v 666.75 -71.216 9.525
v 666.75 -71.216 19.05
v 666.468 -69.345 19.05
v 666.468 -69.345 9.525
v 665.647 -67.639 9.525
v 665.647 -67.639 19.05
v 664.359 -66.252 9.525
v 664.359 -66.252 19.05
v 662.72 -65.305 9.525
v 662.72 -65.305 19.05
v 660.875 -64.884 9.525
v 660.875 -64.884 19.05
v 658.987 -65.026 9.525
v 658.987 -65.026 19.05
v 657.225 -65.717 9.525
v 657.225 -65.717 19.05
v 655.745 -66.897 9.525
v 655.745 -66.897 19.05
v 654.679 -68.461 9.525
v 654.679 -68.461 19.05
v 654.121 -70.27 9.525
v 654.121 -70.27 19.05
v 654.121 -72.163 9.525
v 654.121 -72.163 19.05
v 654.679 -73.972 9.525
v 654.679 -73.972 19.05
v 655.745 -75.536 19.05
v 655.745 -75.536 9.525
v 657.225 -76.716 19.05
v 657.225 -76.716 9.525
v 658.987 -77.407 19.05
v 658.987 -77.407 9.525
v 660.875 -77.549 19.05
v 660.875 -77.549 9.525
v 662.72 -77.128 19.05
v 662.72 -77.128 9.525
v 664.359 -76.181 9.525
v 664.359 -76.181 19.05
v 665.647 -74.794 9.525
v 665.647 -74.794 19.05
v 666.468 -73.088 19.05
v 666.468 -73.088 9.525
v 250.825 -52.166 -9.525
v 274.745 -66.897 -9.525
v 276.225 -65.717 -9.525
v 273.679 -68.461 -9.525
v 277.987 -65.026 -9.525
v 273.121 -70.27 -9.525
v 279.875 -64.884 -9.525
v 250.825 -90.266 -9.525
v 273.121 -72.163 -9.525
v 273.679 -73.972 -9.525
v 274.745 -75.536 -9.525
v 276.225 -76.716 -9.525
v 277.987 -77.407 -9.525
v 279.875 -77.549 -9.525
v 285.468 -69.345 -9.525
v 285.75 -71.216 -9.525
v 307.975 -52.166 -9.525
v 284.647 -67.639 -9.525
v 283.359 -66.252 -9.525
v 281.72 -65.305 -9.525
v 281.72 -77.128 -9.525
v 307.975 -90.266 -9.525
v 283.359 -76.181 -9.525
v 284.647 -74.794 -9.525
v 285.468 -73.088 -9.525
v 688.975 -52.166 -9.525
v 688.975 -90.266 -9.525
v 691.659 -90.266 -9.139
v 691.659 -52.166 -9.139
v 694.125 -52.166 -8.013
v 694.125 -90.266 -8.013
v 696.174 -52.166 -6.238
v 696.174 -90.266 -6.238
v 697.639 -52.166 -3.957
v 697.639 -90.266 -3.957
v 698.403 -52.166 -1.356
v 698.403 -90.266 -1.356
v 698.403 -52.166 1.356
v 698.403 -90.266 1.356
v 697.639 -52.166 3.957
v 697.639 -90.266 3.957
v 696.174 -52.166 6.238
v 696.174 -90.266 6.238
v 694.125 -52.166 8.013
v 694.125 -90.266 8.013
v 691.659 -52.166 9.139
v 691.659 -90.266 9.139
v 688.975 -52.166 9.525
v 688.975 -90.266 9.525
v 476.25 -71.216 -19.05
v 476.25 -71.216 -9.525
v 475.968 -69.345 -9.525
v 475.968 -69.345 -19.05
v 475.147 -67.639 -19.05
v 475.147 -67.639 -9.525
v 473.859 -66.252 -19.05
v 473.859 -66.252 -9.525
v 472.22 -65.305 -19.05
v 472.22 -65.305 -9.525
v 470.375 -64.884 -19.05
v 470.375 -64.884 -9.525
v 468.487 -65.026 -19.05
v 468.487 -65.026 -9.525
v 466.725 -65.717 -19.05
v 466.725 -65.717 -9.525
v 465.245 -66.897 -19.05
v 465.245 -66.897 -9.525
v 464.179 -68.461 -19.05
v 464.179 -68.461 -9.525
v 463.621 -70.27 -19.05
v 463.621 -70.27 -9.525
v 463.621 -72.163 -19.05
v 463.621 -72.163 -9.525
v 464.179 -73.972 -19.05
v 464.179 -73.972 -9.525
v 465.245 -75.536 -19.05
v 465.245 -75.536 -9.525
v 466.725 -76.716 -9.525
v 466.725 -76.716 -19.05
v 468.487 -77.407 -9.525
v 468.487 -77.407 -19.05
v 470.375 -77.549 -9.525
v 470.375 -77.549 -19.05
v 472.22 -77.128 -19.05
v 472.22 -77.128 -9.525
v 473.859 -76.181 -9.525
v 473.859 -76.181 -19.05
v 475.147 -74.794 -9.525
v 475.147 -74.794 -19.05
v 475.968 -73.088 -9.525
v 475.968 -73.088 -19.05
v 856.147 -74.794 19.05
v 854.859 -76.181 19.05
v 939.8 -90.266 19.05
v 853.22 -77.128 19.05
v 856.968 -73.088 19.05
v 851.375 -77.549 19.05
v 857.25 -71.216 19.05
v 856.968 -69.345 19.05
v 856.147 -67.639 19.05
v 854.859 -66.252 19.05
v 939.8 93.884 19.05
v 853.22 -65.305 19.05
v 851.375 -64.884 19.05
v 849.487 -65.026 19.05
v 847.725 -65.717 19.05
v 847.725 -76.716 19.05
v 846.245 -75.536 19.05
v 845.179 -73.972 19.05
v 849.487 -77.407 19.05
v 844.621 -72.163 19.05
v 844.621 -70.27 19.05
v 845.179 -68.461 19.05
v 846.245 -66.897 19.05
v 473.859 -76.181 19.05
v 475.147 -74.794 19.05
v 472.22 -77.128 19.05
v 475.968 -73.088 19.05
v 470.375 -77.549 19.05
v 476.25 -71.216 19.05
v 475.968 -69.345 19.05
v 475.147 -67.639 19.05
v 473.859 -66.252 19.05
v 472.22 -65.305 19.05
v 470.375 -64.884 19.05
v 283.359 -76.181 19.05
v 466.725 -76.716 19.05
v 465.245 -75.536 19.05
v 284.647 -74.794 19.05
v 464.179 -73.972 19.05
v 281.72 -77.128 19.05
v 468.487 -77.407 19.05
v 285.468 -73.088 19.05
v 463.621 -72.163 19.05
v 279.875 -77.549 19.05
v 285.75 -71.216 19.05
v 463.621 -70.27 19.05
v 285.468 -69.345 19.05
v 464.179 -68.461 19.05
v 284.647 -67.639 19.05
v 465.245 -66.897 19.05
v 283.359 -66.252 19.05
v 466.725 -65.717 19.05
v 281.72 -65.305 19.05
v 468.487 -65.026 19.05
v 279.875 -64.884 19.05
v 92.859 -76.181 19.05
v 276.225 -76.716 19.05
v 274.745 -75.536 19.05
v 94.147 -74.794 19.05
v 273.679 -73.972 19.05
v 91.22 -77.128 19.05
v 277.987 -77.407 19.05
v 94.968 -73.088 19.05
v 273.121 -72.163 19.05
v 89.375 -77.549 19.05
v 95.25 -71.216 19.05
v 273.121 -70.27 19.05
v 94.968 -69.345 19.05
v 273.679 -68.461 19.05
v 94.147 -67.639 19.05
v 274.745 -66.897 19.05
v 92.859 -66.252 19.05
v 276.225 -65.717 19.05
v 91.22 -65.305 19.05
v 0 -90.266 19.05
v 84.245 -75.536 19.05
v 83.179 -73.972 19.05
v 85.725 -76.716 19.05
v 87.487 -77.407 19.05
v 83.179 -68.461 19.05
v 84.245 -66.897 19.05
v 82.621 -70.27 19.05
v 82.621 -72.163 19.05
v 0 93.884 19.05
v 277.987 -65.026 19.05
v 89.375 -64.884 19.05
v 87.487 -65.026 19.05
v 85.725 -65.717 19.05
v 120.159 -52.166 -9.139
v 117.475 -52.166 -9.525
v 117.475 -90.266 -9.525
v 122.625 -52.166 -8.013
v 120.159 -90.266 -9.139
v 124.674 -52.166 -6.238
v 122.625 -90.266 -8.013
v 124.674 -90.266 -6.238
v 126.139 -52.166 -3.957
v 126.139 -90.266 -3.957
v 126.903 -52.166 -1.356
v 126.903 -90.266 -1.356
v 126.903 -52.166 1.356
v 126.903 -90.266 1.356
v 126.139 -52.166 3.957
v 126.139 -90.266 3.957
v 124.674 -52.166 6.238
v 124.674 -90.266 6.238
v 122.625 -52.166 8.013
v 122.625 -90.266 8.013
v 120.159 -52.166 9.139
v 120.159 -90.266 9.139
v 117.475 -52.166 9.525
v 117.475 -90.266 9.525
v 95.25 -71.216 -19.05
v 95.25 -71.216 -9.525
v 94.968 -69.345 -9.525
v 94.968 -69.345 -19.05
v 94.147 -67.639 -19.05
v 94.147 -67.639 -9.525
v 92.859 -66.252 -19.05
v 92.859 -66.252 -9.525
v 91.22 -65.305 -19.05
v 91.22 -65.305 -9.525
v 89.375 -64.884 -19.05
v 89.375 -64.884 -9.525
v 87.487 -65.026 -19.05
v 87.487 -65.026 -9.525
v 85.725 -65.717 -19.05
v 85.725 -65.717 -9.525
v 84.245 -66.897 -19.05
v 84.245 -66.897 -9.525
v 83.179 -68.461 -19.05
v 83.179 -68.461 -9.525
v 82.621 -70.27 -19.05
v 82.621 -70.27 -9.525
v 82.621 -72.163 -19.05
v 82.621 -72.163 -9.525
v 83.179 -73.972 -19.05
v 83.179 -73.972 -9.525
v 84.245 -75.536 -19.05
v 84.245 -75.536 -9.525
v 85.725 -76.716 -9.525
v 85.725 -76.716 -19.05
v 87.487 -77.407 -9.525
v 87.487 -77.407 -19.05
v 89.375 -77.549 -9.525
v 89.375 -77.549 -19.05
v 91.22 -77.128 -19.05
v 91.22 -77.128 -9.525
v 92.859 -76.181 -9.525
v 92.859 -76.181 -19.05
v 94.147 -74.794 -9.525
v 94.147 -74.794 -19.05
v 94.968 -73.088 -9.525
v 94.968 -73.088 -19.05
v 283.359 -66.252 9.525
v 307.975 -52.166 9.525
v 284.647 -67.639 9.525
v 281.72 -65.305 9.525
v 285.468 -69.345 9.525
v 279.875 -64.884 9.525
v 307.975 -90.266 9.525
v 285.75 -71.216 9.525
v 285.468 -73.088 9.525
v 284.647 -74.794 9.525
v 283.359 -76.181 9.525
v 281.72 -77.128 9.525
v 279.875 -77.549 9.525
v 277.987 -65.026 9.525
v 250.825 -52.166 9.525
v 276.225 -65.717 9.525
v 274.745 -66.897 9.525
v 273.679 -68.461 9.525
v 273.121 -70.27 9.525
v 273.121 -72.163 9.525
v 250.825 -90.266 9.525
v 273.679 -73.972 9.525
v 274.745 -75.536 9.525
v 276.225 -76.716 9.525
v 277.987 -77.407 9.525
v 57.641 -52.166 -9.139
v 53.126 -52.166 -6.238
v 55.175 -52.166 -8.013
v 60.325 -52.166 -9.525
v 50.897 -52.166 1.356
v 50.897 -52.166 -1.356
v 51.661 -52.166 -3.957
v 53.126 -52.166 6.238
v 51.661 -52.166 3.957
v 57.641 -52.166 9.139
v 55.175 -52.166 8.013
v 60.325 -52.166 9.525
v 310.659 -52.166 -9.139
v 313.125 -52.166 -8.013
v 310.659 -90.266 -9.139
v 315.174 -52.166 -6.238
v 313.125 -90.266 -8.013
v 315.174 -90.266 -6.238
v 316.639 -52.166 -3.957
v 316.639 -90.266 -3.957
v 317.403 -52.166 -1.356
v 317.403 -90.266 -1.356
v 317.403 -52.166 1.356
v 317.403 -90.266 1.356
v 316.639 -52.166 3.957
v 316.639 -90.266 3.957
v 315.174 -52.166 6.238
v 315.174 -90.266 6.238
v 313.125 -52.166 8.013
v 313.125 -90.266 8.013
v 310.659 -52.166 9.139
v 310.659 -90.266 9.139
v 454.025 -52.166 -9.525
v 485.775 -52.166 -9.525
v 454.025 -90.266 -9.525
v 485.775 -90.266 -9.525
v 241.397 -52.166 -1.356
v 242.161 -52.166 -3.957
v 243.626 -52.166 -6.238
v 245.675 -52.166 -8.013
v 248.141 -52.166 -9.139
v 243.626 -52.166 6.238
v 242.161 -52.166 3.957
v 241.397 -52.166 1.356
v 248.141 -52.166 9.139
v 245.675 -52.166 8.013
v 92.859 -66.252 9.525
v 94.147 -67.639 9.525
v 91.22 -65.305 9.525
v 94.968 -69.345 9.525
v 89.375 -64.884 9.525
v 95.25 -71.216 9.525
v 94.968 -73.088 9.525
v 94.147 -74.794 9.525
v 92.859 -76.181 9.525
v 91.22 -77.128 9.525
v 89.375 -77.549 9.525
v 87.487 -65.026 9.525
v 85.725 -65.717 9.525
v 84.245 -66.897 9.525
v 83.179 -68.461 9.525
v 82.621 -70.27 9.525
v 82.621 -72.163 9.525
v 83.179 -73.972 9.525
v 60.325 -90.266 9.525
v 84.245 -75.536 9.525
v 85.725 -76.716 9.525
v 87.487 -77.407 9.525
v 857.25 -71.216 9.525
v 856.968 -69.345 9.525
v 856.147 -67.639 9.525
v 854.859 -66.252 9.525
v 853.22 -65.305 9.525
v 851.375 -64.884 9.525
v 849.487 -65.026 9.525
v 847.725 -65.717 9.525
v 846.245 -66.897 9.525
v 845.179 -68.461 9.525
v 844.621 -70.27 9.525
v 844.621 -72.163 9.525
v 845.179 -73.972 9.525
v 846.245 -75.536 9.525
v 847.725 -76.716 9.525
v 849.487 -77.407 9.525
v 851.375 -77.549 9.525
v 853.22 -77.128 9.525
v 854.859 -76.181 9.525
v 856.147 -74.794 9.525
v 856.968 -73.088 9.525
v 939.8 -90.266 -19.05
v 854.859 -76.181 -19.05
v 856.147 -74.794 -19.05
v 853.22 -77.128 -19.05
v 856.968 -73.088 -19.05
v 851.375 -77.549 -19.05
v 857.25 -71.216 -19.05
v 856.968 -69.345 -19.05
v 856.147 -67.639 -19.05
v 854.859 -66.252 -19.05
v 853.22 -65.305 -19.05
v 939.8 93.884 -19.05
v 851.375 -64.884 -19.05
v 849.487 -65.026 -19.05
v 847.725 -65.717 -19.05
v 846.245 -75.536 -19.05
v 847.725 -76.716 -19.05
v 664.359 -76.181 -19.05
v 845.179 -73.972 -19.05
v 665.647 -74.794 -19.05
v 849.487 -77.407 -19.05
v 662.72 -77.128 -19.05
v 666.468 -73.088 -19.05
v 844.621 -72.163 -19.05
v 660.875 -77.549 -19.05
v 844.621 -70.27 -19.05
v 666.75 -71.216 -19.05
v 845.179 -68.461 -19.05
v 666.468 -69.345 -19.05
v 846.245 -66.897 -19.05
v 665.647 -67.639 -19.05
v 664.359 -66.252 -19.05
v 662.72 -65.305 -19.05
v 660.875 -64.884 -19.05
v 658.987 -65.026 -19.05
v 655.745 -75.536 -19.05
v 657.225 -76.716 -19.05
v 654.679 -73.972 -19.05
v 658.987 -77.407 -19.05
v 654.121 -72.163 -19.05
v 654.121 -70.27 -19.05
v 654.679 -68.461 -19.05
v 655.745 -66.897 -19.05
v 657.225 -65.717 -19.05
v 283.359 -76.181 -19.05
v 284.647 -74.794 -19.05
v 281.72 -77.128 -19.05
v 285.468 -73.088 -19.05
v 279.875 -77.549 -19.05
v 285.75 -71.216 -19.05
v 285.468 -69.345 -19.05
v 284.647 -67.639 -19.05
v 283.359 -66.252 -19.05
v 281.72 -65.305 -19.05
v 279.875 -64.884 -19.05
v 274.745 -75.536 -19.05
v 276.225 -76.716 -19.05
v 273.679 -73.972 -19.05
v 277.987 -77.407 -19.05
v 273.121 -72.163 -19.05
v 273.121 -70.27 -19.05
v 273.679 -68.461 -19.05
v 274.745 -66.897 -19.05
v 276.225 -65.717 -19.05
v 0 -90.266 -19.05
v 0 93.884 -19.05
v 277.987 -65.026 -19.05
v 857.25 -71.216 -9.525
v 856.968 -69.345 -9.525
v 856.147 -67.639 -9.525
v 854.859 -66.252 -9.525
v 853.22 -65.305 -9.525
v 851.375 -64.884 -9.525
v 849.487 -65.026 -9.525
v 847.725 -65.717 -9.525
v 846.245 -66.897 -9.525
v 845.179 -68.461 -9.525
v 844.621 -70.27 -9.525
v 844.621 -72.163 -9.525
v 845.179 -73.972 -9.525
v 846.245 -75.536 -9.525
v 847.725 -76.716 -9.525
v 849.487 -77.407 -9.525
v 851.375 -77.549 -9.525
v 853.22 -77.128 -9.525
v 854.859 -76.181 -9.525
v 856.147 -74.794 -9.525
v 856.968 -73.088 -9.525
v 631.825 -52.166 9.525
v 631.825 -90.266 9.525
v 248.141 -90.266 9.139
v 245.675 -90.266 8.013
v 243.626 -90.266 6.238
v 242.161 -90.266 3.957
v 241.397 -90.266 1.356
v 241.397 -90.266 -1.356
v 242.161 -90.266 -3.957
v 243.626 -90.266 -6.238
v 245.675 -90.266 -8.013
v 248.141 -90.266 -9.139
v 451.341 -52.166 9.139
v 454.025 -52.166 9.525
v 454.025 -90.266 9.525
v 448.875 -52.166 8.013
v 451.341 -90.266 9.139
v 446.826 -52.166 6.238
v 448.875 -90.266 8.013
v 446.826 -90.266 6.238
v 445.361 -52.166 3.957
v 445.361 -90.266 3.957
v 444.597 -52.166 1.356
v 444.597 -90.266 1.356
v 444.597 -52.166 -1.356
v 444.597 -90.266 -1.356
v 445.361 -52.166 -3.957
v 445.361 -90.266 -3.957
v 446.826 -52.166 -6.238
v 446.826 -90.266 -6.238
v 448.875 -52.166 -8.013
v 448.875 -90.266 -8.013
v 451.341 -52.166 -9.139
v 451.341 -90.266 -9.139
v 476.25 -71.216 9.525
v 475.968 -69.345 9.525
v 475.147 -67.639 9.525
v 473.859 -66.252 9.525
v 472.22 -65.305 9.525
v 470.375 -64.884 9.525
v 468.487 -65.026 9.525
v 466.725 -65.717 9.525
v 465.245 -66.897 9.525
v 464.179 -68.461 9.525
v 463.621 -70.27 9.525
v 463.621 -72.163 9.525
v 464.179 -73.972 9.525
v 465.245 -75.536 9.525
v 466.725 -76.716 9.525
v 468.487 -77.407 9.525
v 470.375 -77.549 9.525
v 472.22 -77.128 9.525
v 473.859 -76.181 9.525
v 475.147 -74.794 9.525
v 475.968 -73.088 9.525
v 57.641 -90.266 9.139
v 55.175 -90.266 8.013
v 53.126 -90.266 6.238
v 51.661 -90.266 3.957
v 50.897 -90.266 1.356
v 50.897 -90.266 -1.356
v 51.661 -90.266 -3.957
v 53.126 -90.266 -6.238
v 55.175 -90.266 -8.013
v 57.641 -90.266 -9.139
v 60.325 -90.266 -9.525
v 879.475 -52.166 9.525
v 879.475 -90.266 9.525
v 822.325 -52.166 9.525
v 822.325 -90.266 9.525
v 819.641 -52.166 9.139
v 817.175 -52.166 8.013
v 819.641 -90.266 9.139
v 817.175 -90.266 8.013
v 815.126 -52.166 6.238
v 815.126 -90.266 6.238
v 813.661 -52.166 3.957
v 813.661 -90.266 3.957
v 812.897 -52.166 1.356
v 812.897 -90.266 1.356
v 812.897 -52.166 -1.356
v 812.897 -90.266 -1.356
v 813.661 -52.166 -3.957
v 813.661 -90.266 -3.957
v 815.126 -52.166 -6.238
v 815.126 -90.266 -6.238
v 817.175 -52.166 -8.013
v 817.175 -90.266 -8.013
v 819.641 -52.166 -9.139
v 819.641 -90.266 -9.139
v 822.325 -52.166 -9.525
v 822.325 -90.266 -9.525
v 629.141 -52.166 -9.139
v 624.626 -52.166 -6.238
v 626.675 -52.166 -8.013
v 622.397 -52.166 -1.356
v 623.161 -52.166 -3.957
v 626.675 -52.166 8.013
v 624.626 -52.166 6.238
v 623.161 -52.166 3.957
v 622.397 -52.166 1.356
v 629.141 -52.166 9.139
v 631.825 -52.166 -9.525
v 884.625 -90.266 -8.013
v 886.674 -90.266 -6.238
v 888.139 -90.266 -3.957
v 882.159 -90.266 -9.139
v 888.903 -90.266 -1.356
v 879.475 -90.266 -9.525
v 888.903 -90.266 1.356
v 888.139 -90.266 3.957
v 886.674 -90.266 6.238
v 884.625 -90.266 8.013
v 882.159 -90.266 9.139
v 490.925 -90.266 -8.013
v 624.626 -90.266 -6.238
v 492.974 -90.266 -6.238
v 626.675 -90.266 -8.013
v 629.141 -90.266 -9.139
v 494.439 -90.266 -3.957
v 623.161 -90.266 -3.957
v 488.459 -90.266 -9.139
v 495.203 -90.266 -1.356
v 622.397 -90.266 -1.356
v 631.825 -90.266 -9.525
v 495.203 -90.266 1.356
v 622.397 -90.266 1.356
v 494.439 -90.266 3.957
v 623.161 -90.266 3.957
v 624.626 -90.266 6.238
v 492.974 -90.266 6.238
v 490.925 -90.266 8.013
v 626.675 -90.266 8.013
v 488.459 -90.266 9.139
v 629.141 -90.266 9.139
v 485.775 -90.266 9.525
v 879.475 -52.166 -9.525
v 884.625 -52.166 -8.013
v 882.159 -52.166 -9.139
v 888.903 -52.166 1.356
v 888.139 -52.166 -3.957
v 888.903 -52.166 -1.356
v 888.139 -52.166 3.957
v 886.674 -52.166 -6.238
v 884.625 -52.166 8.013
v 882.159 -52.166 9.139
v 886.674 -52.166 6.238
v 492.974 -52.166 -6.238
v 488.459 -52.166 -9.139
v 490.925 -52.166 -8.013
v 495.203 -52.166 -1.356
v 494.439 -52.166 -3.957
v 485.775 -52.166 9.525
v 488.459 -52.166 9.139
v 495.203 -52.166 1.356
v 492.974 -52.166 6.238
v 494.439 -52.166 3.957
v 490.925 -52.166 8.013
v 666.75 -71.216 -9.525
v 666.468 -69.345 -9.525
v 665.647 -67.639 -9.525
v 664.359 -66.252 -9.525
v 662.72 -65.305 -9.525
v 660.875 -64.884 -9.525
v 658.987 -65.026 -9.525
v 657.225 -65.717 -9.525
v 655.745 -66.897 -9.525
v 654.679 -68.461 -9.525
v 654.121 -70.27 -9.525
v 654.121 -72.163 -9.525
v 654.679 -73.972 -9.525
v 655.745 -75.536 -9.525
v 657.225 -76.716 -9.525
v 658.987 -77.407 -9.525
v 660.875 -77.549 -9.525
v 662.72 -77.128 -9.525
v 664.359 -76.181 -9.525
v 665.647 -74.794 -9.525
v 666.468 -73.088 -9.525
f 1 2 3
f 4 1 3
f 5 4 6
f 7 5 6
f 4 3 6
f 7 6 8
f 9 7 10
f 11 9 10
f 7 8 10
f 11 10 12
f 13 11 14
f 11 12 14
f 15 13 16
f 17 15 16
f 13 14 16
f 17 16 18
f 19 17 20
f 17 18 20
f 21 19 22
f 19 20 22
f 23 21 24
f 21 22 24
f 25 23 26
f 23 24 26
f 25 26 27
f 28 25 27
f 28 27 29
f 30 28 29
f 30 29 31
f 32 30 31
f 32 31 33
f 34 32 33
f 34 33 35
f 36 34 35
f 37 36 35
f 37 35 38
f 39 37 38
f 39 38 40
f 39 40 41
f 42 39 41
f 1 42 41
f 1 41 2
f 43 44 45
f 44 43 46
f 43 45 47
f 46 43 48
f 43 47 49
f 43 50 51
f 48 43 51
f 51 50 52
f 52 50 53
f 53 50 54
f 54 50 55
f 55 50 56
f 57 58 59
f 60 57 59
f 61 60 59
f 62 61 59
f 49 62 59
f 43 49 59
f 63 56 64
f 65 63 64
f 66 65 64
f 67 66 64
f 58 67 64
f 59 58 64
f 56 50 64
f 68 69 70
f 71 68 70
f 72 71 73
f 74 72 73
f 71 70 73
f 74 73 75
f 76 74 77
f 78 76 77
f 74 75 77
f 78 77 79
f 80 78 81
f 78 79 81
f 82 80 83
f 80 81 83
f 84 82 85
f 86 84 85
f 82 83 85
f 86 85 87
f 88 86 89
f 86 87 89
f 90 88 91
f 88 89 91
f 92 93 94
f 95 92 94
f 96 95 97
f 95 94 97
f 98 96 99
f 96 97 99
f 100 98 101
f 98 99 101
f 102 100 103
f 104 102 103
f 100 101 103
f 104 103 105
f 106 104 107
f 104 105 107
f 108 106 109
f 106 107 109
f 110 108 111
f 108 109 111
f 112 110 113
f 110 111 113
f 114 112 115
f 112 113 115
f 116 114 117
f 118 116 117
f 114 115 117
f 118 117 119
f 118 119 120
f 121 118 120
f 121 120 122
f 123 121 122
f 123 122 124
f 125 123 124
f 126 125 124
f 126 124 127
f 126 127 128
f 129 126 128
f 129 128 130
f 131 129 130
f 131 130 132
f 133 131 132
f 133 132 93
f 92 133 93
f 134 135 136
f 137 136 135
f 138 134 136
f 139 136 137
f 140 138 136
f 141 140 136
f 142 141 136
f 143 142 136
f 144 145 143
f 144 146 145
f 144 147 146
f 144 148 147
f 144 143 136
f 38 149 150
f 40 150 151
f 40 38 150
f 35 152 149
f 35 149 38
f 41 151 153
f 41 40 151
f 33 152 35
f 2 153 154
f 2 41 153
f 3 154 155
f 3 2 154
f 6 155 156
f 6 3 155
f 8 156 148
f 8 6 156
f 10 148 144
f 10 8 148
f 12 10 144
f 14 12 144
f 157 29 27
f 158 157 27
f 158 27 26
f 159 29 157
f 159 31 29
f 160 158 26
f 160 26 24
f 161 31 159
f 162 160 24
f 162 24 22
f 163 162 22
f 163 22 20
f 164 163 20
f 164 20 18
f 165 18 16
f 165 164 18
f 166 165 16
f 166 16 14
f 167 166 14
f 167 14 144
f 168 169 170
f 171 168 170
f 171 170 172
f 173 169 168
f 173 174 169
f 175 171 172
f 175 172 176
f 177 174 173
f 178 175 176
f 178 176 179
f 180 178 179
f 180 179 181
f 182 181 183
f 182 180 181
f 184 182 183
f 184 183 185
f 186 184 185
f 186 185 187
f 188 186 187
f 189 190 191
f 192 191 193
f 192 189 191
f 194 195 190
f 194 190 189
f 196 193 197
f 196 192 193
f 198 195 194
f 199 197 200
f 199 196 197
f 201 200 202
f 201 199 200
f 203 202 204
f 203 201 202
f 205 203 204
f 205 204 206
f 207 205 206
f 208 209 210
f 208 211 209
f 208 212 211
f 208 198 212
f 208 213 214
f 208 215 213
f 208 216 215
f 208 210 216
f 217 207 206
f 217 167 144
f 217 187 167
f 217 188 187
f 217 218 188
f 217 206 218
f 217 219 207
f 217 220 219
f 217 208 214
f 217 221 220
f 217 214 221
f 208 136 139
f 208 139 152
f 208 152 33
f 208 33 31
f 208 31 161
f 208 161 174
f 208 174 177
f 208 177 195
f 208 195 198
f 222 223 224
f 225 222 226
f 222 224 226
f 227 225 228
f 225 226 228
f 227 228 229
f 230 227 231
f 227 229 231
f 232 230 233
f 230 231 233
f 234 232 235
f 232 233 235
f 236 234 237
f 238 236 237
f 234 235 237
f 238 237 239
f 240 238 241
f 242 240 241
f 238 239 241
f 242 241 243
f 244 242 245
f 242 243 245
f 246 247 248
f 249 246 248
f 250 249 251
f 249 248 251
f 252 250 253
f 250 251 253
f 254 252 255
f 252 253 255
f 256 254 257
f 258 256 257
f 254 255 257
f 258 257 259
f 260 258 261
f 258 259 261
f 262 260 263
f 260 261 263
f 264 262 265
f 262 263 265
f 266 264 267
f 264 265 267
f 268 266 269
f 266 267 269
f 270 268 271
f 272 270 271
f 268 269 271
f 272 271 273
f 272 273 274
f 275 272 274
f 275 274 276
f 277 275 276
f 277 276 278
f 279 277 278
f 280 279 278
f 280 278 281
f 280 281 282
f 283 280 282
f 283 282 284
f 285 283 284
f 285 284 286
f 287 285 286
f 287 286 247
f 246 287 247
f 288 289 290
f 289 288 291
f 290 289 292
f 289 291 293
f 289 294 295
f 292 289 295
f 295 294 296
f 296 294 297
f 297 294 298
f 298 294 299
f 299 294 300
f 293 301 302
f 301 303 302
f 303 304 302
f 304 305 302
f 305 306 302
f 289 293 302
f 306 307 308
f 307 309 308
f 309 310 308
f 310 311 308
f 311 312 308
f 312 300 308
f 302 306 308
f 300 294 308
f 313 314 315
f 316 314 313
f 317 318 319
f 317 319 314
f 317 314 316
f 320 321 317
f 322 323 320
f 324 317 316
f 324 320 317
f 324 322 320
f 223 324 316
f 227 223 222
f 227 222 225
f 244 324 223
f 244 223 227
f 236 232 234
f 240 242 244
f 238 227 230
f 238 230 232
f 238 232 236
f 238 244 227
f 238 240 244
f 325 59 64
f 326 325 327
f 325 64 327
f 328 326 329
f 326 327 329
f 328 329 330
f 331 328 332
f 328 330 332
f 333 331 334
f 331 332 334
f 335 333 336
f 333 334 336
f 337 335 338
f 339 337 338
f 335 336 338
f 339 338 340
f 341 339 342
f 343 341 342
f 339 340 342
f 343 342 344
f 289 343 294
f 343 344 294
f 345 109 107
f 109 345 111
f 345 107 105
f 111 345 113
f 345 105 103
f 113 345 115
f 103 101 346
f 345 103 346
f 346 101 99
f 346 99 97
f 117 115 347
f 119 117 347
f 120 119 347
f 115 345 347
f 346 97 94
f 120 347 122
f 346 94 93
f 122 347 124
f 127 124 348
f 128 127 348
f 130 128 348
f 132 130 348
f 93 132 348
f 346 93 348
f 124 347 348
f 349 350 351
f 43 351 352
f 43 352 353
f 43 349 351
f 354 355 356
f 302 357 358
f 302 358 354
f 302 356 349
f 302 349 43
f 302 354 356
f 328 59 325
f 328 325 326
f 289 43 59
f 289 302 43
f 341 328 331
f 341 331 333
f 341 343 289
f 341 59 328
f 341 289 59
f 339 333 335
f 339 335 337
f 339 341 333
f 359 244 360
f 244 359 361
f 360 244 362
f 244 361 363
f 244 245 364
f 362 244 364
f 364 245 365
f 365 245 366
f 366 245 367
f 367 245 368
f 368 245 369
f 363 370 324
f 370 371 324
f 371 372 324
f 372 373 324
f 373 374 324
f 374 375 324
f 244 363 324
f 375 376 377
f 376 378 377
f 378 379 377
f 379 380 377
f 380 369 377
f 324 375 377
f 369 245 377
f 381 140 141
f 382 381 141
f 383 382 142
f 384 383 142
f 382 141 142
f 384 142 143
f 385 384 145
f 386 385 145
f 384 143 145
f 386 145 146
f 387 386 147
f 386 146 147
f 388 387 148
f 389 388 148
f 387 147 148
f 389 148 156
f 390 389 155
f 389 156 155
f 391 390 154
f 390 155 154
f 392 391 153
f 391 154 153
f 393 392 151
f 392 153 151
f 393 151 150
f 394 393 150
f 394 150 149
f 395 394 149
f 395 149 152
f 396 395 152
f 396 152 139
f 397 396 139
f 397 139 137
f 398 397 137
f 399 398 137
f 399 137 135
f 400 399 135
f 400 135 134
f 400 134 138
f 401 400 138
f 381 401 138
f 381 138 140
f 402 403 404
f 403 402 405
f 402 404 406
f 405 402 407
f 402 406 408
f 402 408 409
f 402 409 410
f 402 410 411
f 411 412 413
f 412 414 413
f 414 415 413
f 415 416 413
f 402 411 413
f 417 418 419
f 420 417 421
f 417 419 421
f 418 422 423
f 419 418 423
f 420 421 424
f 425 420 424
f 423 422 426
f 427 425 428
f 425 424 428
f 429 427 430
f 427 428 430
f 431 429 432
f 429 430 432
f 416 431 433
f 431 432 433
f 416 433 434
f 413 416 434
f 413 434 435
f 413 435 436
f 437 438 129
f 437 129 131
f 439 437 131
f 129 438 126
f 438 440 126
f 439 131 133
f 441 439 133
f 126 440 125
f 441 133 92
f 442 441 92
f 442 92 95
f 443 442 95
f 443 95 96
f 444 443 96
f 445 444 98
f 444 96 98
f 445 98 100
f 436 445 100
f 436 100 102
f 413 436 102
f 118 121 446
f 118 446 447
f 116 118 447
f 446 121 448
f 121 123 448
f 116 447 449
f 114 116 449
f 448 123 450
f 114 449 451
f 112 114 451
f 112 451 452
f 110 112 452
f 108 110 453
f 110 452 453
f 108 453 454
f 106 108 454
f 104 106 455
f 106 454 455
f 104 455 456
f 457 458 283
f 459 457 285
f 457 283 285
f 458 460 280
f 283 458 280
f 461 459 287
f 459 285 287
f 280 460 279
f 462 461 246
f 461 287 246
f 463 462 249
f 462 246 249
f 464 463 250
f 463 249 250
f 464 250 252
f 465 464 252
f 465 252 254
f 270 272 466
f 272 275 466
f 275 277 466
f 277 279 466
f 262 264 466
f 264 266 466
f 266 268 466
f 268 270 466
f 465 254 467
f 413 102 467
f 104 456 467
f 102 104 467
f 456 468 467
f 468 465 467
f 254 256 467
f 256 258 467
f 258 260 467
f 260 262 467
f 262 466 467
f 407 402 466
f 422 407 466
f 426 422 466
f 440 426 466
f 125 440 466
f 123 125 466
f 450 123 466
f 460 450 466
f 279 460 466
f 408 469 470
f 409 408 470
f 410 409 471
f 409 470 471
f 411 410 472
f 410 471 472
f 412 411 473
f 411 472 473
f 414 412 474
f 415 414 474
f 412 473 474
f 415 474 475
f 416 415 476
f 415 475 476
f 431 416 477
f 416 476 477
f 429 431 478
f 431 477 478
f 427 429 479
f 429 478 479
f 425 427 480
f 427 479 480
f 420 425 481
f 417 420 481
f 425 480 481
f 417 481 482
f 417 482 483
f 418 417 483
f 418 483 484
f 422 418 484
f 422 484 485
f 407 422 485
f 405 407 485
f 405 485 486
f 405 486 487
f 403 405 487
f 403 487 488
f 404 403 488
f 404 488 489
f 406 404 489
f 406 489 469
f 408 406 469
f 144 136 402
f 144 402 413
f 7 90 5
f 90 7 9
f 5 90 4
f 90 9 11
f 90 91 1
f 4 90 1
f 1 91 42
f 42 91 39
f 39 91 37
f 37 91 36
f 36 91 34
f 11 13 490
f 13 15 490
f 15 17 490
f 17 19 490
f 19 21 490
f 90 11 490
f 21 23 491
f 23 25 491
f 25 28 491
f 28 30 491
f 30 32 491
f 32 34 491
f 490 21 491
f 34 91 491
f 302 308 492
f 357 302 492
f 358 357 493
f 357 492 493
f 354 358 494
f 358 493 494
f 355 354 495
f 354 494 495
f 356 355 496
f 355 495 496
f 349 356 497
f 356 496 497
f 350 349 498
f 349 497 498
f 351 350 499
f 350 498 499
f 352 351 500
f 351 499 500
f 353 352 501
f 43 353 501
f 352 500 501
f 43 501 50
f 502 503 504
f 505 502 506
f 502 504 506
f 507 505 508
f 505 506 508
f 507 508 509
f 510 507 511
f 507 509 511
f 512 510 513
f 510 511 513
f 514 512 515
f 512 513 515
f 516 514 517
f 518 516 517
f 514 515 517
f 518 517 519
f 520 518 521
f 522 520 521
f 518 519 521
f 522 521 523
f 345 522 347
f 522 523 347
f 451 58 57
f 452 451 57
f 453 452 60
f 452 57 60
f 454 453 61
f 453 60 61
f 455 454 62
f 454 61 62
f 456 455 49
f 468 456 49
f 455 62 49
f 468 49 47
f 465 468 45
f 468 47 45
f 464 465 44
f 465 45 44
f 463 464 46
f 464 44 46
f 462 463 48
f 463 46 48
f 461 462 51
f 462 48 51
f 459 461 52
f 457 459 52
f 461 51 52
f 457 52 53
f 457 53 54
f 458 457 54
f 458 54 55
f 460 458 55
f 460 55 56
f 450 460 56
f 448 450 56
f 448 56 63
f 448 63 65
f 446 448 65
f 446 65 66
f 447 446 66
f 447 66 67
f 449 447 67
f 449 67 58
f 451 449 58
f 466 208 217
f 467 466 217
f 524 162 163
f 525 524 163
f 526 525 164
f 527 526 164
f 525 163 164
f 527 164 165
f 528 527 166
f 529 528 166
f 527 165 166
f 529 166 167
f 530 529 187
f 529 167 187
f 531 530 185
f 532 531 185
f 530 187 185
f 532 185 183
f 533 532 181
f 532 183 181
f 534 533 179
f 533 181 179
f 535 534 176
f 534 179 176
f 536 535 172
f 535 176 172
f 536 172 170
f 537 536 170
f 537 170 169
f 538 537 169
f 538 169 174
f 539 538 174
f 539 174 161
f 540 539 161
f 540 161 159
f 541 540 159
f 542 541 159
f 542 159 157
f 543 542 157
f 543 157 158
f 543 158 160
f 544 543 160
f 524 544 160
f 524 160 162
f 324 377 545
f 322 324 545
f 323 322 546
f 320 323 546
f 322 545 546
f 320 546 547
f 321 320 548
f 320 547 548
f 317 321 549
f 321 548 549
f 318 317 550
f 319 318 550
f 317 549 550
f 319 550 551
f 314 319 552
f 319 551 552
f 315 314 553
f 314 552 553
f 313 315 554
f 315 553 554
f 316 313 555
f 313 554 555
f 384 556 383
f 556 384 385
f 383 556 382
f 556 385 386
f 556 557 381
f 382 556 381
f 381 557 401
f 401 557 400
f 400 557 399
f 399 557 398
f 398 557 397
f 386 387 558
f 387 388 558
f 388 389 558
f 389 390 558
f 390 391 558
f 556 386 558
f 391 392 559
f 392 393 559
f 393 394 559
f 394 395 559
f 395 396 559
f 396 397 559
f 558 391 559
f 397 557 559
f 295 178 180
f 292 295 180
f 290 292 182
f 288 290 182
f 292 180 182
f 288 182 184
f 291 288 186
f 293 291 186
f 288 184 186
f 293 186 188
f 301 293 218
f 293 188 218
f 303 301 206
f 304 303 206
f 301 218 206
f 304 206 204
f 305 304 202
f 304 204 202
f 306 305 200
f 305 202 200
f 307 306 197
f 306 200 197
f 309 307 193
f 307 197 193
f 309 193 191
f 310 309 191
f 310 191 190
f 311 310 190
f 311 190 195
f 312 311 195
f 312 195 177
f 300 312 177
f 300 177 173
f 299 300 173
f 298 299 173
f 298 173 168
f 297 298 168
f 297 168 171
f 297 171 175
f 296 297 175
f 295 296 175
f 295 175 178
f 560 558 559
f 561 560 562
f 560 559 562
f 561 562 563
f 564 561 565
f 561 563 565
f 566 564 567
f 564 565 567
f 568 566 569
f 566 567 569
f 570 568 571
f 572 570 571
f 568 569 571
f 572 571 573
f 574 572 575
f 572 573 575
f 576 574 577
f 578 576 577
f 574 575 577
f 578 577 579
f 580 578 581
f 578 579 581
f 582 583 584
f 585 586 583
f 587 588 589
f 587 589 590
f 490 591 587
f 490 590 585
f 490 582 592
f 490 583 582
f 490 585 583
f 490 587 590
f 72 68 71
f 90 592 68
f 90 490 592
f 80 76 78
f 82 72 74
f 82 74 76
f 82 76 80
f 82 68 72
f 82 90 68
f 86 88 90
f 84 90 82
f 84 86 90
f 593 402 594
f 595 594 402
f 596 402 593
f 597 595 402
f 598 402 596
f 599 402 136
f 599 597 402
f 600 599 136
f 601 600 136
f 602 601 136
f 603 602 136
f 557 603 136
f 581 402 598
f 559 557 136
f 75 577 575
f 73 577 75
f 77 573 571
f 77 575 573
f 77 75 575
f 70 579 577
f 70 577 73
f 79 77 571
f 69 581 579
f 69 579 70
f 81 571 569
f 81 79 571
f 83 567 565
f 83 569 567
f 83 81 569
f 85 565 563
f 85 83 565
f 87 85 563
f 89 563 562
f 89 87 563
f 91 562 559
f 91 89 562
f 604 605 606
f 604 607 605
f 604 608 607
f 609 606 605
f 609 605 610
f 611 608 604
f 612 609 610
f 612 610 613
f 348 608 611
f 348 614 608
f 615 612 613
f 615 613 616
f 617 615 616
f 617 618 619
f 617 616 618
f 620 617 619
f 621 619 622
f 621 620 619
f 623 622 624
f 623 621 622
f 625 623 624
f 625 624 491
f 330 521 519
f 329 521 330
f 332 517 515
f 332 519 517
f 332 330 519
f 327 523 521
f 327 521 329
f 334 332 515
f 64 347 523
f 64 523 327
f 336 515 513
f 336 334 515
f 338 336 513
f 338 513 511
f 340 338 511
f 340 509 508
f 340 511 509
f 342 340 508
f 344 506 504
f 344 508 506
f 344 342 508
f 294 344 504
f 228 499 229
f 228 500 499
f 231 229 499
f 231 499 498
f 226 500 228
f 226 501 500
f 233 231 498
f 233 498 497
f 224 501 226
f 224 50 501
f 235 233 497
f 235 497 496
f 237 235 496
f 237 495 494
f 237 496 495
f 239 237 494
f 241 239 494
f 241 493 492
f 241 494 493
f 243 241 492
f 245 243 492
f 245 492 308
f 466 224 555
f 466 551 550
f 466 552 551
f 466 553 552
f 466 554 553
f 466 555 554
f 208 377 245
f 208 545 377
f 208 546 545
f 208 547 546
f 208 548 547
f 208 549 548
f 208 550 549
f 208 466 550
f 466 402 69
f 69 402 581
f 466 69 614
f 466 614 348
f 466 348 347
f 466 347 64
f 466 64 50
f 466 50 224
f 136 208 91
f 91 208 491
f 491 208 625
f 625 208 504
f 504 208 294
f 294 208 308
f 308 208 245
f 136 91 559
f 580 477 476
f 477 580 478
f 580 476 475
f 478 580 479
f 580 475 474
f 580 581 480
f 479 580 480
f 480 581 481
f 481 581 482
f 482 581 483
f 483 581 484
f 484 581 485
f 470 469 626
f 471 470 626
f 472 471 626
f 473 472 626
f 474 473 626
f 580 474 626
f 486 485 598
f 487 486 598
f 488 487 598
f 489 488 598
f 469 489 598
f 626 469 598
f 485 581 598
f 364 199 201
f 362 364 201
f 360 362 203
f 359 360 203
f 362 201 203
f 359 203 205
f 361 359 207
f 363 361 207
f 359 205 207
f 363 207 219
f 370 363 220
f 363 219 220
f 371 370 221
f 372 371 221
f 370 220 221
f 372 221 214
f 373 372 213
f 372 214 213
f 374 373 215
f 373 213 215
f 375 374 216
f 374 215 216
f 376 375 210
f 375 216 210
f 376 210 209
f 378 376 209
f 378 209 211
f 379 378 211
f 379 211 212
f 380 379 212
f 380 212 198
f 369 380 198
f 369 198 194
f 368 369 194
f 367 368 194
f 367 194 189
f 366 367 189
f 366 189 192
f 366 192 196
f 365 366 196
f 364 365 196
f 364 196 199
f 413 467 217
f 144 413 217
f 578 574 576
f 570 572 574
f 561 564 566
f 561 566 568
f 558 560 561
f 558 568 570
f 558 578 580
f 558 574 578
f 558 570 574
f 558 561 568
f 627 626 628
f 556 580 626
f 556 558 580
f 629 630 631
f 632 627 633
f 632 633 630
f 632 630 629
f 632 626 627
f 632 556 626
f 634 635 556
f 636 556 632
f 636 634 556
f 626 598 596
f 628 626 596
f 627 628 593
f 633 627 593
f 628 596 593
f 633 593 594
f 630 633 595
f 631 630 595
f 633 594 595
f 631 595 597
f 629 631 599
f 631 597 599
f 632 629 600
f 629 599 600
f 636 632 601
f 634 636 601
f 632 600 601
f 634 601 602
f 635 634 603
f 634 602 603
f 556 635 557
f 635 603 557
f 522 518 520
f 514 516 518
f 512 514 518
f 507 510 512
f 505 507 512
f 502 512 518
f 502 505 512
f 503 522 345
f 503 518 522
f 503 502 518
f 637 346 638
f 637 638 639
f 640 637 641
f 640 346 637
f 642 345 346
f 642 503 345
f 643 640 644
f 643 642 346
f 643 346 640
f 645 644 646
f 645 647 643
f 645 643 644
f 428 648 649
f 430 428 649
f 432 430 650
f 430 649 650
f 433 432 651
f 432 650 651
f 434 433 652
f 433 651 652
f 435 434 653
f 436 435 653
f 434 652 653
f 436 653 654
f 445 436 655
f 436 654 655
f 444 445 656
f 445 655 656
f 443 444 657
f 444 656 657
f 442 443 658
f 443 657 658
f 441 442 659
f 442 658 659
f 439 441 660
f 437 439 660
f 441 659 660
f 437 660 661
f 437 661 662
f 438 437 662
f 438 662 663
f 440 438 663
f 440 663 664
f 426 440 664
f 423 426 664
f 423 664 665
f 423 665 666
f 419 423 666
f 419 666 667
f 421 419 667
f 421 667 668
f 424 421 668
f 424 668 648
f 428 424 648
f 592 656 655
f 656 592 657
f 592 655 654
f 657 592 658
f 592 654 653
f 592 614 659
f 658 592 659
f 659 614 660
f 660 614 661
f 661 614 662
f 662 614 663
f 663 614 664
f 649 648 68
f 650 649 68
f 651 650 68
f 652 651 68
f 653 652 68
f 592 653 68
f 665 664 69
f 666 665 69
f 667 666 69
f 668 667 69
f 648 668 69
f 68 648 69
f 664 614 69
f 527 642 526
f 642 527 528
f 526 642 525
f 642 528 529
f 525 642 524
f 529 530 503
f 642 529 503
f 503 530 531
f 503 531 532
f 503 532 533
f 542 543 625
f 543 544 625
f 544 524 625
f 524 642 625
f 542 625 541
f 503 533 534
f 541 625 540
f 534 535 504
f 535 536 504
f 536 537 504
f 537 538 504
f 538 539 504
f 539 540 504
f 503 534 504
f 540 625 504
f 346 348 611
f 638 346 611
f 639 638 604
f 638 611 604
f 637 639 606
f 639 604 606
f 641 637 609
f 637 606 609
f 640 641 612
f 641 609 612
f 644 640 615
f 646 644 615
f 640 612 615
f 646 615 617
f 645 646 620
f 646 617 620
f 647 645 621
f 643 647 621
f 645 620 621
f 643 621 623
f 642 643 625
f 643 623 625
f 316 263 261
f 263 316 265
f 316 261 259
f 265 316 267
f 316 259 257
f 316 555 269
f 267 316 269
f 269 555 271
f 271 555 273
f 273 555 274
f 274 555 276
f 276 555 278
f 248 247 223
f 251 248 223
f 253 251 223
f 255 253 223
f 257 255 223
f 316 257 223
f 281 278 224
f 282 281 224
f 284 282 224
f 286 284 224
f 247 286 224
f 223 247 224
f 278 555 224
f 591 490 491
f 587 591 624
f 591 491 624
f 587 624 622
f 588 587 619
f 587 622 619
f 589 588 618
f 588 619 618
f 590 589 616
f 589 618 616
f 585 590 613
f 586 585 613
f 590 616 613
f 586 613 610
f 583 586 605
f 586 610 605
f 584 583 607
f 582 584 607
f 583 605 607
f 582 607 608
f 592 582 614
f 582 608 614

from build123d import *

# Parameters (mm, degrees)
F0_W     = 184.15
F0_H     = 38.1
F1_DEPTH = 939.8
F3_DEPTH = 38.1
F4_R     = 6.35
F5_DEPTH = 38.101


# Not quite as in the source:
# - a feature names something its author has since deleted; it is built from what else it names


with BuildPart() as f1:
    # F0 (on Right) → F1 (new body)
    with BuildSketch(Plane.YZ):
        with Locations((1.8085447712, 0)):
            Rectangle(F0_W, F0_H)
    extrude(amount=F1_DEPTH)

    # F2 (on face) → F3 (cut)
    with BuildSketch(Plane.XZ.offset(90.2664552288)):
        with BuildLine():
            Line((117.475, 9.525), (60.325, 9.525))
            ThreePointArc((60.325, 9.525), (50.8, 0), (60.325, -9.525))
            Line((60.325, -9.525), (117.475, -9.525))
            ThreePointArc((117.475, -9.525), (127, 0), (117.475, 9.525))
        make_face()
        with BuildLine():
            Line((307.975, 9.525), (250.825, 9.525))
            ThreePointArc((250.825, 9.525), (241.3, 0), (250.825, -9.525))
            Line((250.825, -9.525), (307.975, -9.525))
            ThreePointArc((307.975, -9.525), (317.5, 0), (307.975, 9.525))
        make_face()
        with BuildLine():
            Line((688.975, 9.525), (631.825, 9.525))
            ThreePointArc((631.825, 9.525), (622.3, 0), (631.825, -9.525))
            Line((631.825, -9.525), (688.975, -9.525))
            ThreePointArc((688.975, -9.525), (698.5, 0), (688.975, 9.525))
        make_face()
        with BuildLine():
            Line((879.475, 9.525), (822.325, 9.525))
            ThreePointArc((822.325, 9.525), (812.8, 0), (822.325, -9.525))
            Line((822.325, -9.525), (879.475, -9.525))
            ThreePointArc((879.475, -9.525), (889, 0), (879.475, 9.525))
        make_face()
        with BuildLine():
            Line((485.775, 9.525), (454.025, 9.525))
            ThreePointArc((454.025, 9.525), (444.5, 0), (454.025, -9.525))
            Line((454.025, -9.525), (485.775, -9.525))
            ThreePointArc((485.775, -9.525), (495.3, 0), (485.775, 9.525))
        make_face()
    extrude(amount=-F3_DEPTH, mode=Mode.SUBTRACT)

    # F4 (on face) → F5 (cut, through all)
    with BuildSketch(Plane.XY.offset(19.05)):
        with Locations((88.9, -71.2164552288)):
            Circle(F4_R)
        with Locations((279.4, -71.2164552288)):
            Circle(F4_R)
        with Locations((469.9, -71.2164552288)):
            Circle(F4_R)
        with Locations((660.4, -71.2164552288)):
            Circle(F4_R)
        with Locations((850.9, -71.2164552288)):
            Circle(F4_R)
    extrude(amount=-F5_DEPTH, mode=Mode.SUBTRACT)


solid = f1.part
